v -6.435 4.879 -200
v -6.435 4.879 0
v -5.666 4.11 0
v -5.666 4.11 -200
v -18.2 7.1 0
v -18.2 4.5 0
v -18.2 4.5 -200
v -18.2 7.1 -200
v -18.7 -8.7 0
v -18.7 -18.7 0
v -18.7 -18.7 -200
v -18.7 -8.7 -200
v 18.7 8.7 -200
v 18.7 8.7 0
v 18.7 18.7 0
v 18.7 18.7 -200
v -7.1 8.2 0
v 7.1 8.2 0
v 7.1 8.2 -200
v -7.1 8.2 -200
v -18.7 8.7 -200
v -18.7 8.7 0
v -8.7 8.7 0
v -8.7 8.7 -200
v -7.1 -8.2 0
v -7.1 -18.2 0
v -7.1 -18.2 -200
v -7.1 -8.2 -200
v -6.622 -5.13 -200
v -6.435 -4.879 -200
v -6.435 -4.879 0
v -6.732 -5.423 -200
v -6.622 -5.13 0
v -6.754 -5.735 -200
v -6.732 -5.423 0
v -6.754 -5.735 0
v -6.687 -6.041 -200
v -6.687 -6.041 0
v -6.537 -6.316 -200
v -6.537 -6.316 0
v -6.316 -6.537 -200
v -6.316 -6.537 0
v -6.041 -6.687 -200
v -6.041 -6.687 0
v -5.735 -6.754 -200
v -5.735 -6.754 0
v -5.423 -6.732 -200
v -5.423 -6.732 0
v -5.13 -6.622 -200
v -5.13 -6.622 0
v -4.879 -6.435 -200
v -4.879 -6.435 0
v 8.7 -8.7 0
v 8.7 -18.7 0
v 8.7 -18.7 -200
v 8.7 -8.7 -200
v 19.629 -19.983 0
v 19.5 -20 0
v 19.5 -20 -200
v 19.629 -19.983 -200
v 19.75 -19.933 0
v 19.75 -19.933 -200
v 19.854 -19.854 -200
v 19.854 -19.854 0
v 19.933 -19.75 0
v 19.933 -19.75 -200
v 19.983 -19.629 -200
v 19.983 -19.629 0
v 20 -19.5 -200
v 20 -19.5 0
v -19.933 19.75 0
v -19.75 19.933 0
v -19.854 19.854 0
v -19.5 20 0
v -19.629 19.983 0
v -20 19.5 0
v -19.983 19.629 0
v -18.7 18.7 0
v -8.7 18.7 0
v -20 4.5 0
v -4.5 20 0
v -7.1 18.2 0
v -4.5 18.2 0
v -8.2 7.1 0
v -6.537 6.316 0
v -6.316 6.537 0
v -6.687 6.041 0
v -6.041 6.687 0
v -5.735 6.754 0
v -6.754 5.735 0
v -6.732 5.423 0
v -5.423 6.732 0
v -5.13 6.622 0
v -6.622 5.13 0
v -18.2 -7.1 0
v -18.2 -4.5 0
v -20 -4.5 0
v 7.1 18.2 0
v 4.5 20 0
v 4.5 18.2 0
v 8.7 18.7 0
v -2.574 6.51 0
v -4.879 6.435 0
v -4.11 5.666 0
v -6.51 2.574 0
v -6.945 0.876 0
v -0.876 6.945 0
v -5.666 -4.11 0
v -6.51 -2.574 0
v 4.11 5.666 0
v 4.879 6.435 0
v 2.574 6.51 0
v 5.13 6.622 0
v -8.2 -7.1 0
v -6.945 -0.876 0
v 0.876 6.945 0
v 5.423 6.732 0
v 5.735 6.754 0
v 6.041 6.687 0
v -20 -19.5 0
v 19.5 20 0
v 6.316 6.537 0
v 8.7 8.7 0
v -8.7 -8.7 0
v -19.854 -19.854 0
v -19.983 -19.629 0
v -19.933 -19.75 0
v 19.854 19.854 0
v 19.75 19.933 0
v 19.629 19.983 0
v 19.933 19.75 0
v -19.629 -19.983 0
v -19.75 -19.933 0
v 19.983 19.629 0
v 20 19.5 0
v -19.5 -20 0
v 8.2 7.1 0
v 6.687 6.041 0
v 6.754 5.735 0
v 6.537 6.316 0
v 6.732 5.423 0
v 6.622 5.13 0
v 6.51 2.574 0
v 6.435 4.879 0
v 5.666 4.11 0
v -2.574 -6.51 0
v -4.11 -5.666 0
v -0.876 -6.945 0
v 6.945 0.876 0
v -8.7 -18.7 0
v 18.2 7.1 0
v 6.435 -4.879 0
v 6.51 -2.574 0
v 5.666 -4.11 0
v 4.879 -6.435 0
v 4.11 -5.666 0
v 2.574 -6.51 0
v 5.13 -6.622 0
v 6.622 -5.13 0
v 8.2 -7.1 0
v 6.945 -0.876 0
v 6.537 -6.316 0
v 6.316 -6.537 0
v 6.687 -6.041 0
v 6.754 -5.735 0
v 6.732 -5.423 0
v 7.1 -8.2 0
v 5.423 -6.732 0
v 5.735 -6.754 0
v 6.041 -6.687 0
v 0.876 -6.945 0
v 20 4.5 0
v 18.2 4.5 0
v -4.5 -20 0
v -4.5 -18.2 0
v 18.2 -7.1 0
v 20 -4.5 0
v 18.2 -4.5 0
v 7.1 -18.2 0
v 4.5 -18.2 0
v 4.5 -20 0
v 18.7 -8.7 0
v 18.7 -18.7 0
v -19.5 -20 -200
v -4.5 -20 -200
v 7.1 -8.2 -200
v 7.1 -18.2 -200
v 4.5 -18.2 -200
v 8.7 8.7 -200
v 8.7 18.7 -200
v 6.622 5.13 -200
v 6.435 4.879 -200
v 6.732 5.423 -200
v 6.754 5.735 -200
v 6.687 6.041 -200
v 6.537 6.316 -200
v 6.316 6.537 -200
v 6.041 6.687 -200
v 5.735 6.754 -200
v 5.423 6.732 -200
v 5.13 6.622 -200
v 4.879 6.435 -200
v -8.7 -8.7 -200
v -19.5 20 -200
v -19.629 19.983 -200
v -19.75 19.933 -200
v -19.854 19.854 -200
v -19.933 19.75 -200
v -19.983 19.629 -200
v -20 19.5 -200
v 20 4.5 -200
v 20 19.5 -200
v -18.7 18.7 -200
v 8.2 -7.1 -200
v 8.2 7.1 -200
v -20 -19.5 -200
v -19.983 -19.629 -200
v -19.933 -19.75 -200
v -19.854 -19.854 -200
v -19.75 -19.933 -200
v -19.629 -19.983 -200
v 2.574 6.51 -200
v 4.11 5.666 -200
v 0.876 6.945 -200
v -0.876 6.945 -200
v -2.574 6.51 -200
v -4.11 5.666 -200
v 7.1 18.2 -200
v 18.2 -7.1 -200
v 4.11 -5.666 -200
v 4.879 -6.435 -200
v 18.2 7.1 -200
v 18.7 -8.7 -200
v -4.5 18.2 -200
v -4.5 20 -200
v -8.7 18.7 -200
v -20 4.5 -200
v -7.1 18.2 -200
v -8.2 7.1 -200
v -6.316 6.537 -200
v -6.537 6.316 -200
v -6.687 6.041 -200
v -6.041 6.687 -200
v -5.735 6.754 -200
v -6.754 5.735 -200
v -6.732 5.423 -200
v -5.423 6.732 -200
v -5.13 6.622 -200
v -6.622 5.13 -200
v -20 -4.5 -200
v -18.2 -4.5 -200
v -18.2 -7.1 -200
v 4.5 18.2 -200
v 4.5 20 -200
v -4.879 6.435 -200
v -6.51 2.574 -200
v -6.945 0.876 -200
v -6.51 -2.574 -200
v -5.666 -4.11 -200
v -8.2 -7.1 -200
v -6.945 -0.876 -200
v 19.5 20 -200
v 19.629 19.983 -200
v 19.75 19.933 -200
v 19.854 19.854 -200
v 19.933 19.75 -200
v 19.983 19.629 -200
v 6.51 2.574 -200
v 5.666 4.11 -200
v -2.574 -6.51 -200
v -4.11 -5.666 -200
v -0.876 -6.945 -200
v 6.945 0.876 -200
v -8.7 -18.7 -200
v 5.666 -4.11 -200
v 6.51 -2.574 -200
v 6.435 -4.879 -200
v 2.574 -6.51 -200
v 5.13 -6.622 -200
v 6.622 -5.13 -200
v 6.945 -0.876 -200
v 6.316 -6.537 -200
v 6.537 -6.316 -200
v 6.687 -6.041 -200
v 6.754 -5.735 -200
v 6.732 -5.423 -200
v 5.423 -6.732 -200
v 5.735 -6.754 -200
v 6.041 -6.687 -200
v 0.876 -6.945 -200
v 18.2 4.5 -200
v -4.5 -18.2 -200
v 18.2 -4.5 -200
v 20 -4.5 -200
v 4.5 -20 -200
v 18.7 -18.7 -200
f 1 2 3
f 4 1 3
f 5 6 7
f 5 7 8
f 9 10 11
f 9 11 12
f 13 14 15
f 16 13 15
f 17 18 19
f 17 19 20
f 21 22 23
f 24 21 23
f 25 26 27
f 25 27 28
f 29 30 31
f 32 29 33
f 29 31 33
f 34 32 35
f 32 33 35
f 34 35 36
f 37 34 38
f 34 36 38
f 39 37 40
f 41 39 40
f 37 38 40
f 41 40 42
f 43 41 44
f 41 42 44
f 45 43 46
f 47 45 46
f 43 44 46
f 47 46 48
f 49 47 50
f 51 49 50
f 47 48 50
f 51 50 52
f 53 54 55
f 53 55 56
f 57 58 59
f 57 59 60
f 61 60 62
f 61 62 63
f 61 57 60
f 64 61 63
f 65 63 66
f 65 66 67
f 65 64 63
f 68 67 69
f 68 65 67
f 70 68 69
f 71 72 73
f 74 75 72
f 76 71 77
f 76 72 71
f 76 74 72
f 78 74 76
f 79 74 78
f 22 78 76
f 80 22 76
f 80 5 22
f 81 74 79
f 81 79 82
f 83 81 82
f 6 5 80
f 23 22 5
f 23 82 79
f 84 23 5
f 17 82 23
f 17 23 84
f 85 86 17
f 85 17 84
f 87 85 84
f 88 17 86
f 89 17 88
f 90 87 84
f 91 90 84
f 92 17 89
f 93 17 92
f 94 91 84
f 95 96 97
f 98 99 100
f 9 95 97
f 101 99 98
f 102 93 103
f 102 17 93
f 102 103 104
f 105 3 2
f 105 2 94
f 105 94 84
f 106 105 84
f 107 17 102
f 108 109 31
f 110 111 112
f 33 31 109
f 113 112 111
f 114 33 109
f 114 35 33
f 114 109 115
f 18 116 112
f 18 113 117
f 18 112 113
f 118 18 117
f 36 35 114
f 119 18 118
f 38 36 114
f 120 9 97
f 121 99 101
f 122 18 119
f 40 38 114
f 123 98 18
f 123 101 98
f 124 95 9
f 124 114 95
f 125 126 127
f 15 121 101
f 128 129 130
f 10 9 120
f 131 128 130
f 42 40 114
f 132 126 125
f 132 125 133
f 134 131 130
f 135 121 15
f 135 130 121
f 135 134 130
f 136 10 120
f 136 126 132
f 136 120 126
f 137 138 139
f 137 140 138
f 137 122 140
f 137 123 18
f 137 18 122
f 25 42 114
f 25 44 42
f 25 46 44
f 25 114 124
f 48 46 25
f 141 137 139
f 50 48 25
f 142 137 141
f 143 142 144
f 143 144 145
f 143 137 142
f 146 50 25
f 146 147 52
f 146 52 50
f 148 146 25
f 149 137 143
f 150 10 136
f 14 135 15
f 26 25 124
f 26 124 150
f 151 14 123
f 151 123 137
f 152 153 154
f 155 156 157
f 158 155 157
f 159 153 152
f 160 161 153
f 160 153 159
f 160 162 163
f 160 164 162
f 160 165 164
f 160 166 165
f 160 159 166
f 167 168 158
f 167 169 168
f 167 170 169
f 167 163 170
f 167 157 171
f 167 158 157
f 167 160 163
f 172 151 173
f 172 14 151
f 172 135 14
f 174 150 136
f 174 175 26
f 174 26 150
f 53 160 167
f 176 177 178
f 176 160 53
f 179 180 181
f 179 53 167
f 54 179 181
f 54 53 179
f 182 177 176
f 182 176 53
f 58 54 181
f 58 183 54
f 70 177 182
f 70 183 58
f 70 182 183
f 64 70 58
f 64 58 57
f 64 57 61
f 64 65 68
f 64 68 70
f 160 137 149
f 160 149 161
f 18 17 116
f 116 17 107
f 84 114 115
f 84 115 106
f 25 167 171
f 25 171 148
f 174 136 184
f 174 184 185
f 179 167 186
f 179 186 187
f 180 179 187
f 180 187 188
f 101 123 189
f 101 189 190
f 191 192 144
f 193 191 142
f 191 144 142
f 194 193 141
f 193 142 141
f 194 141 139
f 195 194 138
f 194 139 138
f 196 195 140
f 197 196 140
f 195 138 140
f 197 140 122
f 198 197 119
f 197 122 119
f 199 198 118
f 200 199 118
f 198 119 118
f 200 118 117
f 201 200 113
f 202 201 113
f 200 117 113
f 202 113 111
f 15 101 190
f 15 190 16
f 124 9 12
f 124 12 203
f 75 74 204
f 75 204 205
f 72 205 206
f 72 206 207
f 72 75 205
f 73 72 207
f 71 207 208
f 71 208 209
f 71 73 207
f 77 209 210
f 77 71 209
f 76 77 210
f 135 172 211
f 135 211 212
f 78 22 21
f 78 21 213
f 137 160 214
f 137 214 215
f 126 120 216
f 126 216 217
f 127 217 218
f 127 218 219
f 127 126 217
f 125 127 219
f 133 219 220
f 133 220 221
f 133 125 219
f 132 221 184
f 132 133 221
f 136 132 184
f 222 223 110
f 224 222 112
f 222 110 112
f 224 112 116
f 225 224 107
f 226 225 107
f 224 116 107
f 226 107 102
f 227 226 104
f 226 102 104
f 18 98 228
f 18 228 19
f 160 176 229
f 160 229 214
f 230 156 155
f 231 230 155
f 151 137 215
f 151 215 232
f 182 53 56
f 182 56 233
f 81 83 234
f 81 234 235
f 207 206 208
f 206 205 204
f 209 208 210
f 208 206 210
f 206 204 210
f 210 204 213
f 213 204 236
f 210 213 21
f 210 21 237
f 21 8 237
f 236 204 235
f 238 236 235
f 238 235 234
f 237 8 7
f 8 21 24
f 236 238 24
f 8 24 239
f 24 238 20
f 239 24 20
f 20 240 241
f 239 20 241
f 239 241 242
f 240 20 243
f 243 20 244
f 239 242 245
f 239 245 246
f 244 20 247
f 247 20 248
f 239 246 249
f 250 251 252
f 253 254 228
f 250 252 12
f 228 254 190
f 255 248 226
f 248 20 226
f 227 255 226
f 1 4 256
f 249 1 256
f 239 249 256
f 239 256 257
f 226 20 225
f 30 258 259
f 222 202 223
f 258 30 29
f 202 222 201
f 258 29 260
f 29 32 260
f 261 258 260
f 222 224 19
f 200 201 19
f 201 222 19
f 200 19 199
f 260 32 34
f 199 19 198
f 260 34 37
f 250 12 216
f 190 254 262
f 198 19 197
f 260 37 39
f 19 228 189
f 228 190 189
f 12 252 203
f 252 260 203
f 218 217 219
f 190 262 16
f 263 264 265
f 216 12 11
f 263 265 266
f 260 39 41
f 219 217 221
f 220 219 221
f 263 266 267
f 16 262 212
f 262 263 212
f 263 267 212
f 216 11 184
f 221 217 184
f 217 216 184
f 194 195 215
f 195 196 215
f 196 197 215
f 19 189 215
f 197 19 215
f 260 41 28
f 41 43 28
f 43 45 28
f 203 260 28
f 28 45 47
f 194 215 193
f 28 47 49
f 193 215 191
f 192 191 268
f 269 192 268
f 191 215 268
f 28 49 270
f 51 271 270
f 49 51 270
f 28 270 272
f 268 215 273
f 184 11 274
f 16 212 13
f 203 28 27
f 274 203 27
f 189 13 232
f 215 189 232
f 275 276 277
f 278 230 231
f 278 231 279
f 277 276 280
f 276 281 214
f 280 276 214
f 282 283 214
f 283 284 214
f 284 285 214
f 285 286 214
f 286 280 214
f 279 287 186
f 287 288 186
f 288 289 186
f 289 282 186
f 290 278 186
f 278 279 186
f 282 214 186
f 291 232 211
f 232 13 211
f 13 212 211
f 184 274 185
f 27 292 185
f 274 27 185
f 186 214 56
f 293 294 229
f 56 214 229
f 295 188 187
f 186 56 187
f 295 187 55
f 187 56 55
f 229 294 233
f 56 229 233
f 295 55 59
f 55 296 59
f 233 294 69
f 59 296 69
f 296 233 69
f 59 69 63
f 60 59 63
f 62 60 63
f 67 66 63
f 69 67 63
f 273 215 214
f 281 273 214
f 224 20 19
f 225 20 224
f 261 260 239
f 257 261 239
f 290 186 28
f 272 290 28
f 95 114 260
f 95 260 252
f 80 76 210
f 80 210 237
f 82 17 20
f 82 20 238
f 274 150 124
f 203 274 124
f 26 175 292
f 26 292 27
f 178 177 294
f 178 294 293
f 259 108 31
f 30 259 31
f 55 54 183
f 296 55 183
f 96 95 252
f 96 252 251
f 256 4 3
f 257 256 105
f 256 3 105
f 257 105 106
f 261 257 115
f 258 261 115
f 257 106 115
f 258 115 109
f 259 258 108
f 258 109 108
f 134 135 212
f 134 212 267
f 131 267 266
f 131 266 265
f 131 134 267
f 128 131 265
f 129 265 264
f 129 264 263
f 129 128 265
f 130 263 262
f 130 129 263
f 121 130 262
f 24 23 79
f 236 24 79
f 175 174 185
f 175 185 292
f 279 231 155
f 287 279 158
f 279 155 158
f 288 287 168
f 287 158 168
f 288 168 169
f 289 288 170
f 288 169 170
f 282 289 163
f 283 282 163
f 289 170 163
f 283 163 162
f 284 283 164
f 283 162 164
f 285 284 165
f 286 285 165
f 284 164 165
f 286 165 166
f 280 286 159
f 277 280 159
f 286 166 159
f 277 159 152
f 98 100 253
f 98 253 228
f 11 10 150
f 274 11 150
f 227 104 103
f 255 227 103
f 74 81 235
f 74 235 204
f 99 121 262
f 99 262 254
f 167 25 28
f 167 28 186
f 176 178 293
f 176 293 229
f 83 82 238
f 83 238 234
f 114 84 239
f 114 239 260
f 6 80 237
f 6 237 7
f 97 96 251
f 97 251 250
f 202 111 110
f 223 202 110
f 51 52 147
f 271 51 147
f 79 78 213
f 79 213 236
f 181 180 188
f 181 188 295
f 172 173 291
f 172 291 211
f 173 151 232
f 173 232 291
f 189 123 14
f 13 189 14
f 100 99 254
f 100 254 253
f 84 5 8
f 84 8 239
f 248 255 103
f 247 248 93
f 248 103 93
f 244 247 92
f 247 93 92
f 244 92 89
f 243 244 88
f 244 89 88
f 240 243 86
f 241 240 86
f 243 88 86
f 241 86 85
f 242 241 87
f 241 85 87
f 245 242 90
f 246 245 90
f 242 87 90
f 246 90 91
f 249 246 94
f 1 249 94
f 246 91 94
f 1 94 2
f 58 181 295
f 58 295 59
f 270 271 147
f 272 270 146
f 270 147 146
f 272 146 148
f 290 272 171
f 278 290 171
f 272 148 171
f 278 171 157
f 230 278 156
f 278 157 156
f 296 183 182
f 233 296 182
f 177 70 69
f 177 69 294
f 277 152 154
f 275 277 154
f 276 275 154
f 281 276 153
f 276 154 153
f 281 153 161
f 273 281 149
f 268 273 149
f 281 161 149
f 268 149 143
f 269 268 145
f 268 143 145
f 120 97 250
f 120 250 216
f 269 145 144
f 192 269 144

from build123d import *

# Parameters (mm, degrees)
SKETCH1_W                 = 10
SKETCH1_H                 = 10
F_40_X_40A_X_R0_5_1_DEPTH = 200


with BuildPart() as part:
    # Sketch1 → 铝型材 40 X 40A X R0.5(1) (new body)
    with BuildSketch(Plane.YX):
        with BuildLine():
            Line((-19.5, 20), (-4.5, 20))
            Line((-4.5, 20), (-4.5, 18.2))
            Line((-4.5, 18.2), (-7.1, 18.2))
            Line((-7.1, 18.2), (-7.1, 8.2))
            Line((-7.1, 8.2), (7.1, 8.2))
            Line((7.1, 8.2), (7.1, 18.2))
            Line((7.1, 18.2), (4.5, 18.2))
            Line((4.5, 18.2), (4.5, 20))
            Line((4.5, 20), (19.5, 20))
            ThreePointArc((19.5, 20), (19.853553391, 19.853553391), (20, 19.5))
            Line((20, 19.5), (20, 4.5))
            Line((20, 4.5), (18.2, 4.5))
            Line((18.2, 4.5), (18.2, 7.1))
            Line((18.2, 7.1), (8.2, 7.1))
            Line((8.2, 7.1), (8.2, -7.1))
            Line((8.2, -7.1), (18.2, -7.1))
            Line((18.2, -7.1), (18.2, -4.5))
            Line((18.2, -4.5), (20, -4.5))
            Line((20, -4.5), (20, -19.5))
            ThreePointArc((20, -19.5), (19.853553391, -19.853553391), (19.5, -20))
            Line((19.5, -20), (4.5, -20))
            Line((4.5, -20), (4.5, -18.2))
            Line((4.5, -18.2), (7.1, -18.2))
            Line((7.1, -18.2), (7.1, -8.2))
            Line((7.1, -8.2), (-7.1, -8.2))
            Line((-7.1, -8.2), (-7.1, -18.2))
            Line((-7.1, -18.2), (-4.5, -18.2))
            Line((-4.5, -18.2), (-4.5, -20))
            Line((-4.5, -20), (-19.5, -20))
            ThreePointArc((-19.5, -20), (-19.853553391, -19.853553391), (-20, -19.5))
            Line((-20, -19.5), (-20, -4.5))
            Line((-20, -4.5), (-18.2, -4.5))
            Line((-18.2, -4.5), (-18.2, -7.1))
            Line((-18.2, -7.1), (-8.2, -7.1))
            Line((-8.2, -7.1), (-8.2, 7.1))
            Line((-8.2, 7.1), (-18.2, 7.1))
            Line((-18.2, 7.1), (-18.2, 4.5))
            Line((-18.2, 4.5), (-20, 4.5))
            Line((-20, 4.5), (-20, 19.5))
            ThreePointArc((-20, 19.5), (-19.853553391, 19.853553391), (-19.5, 20))
        make_face()
        with BuildLine():
            Line((-4.87903679, 6.434671709), (-4.110433762, 5.66606868))
            ThreePointArc((-4.110433762, 5.66606868), (0, 7), (4.110433762, 5.66606868))
            Line((4.110433762, 5.66606868), (4.87903679, 6.434671709))
            ThreePointArc((4.87903679, 6.434671709), (6.434671709, 6.434671709), (6.434671709, 4.87903679))
            Line((6.434671709, 4.87903679), (5.66606868, 4.110433762))
            ThreePointArc((5.66606868, 4.110433762), (7, 0), (5.66606868, -4.110433762))
            Line((5.66606868, -4.110433762), (6.434671709, -4.87903679))
            ThreePointArc((6.434671709, -4.87903679), (6.434671709, -6.434671709), (4.87903679, -6.434671709))
            Line((4.87903679, -6.434671709), (4.110433762, -5.66606868))
            ThreePointArc((4.110433762, -5.66606868), (0, -7), (-4.110433762, -5.66606868))
            Line((-4.110433762, -5.66606868), (-4.87903679, -6.434671709))
            ThreePointArc((-4.87903679, -6.434671709), (-6.434671709, -6.434671709), (-6.434671709, -4.87903679))
            Line((-6.434671709, -4.87903679), (-5.66606868, -4.110433762))
            ThreePointArc((-5.66606868, -4.110433762), (-7, 0), (-5.66606868, 4.110433762))
            Line((-5.66606868, 4.110433762), (-6.434671709, 4.87903679))
            ThreePointArc((-6.434671709, 4.87903679), (-6.434671709, 6.434671709), (-4.87903679, 6.434671709))
        make_face(mode=Mode.SUBTRACT)
        with Locations((-13.7, 13.7)):
            Rectangle(SKETCH1_W, SKETCH1_H, mode=Mode.SUBTRACT)
        with Locations((13.7, 13.7)):
            Rectangle(SKETCH1_W, SKETCH1_H, mode=Mode.SUBTRACT)
        with Locations((13.7, -13.7)):
            Rectangle(SKETCH1_W, SKETCH1_H, mode=Mode.SUBTRACT)
        with Locations((-13.7, -13.7)):
            Rectangle(SKETCH1_W, SKETCH1_H, mode=Mode.SUBTRACT)
    extrude(amount=F_40_X_40A_X_R0_5_1_DEPTH)


solid = part.part
